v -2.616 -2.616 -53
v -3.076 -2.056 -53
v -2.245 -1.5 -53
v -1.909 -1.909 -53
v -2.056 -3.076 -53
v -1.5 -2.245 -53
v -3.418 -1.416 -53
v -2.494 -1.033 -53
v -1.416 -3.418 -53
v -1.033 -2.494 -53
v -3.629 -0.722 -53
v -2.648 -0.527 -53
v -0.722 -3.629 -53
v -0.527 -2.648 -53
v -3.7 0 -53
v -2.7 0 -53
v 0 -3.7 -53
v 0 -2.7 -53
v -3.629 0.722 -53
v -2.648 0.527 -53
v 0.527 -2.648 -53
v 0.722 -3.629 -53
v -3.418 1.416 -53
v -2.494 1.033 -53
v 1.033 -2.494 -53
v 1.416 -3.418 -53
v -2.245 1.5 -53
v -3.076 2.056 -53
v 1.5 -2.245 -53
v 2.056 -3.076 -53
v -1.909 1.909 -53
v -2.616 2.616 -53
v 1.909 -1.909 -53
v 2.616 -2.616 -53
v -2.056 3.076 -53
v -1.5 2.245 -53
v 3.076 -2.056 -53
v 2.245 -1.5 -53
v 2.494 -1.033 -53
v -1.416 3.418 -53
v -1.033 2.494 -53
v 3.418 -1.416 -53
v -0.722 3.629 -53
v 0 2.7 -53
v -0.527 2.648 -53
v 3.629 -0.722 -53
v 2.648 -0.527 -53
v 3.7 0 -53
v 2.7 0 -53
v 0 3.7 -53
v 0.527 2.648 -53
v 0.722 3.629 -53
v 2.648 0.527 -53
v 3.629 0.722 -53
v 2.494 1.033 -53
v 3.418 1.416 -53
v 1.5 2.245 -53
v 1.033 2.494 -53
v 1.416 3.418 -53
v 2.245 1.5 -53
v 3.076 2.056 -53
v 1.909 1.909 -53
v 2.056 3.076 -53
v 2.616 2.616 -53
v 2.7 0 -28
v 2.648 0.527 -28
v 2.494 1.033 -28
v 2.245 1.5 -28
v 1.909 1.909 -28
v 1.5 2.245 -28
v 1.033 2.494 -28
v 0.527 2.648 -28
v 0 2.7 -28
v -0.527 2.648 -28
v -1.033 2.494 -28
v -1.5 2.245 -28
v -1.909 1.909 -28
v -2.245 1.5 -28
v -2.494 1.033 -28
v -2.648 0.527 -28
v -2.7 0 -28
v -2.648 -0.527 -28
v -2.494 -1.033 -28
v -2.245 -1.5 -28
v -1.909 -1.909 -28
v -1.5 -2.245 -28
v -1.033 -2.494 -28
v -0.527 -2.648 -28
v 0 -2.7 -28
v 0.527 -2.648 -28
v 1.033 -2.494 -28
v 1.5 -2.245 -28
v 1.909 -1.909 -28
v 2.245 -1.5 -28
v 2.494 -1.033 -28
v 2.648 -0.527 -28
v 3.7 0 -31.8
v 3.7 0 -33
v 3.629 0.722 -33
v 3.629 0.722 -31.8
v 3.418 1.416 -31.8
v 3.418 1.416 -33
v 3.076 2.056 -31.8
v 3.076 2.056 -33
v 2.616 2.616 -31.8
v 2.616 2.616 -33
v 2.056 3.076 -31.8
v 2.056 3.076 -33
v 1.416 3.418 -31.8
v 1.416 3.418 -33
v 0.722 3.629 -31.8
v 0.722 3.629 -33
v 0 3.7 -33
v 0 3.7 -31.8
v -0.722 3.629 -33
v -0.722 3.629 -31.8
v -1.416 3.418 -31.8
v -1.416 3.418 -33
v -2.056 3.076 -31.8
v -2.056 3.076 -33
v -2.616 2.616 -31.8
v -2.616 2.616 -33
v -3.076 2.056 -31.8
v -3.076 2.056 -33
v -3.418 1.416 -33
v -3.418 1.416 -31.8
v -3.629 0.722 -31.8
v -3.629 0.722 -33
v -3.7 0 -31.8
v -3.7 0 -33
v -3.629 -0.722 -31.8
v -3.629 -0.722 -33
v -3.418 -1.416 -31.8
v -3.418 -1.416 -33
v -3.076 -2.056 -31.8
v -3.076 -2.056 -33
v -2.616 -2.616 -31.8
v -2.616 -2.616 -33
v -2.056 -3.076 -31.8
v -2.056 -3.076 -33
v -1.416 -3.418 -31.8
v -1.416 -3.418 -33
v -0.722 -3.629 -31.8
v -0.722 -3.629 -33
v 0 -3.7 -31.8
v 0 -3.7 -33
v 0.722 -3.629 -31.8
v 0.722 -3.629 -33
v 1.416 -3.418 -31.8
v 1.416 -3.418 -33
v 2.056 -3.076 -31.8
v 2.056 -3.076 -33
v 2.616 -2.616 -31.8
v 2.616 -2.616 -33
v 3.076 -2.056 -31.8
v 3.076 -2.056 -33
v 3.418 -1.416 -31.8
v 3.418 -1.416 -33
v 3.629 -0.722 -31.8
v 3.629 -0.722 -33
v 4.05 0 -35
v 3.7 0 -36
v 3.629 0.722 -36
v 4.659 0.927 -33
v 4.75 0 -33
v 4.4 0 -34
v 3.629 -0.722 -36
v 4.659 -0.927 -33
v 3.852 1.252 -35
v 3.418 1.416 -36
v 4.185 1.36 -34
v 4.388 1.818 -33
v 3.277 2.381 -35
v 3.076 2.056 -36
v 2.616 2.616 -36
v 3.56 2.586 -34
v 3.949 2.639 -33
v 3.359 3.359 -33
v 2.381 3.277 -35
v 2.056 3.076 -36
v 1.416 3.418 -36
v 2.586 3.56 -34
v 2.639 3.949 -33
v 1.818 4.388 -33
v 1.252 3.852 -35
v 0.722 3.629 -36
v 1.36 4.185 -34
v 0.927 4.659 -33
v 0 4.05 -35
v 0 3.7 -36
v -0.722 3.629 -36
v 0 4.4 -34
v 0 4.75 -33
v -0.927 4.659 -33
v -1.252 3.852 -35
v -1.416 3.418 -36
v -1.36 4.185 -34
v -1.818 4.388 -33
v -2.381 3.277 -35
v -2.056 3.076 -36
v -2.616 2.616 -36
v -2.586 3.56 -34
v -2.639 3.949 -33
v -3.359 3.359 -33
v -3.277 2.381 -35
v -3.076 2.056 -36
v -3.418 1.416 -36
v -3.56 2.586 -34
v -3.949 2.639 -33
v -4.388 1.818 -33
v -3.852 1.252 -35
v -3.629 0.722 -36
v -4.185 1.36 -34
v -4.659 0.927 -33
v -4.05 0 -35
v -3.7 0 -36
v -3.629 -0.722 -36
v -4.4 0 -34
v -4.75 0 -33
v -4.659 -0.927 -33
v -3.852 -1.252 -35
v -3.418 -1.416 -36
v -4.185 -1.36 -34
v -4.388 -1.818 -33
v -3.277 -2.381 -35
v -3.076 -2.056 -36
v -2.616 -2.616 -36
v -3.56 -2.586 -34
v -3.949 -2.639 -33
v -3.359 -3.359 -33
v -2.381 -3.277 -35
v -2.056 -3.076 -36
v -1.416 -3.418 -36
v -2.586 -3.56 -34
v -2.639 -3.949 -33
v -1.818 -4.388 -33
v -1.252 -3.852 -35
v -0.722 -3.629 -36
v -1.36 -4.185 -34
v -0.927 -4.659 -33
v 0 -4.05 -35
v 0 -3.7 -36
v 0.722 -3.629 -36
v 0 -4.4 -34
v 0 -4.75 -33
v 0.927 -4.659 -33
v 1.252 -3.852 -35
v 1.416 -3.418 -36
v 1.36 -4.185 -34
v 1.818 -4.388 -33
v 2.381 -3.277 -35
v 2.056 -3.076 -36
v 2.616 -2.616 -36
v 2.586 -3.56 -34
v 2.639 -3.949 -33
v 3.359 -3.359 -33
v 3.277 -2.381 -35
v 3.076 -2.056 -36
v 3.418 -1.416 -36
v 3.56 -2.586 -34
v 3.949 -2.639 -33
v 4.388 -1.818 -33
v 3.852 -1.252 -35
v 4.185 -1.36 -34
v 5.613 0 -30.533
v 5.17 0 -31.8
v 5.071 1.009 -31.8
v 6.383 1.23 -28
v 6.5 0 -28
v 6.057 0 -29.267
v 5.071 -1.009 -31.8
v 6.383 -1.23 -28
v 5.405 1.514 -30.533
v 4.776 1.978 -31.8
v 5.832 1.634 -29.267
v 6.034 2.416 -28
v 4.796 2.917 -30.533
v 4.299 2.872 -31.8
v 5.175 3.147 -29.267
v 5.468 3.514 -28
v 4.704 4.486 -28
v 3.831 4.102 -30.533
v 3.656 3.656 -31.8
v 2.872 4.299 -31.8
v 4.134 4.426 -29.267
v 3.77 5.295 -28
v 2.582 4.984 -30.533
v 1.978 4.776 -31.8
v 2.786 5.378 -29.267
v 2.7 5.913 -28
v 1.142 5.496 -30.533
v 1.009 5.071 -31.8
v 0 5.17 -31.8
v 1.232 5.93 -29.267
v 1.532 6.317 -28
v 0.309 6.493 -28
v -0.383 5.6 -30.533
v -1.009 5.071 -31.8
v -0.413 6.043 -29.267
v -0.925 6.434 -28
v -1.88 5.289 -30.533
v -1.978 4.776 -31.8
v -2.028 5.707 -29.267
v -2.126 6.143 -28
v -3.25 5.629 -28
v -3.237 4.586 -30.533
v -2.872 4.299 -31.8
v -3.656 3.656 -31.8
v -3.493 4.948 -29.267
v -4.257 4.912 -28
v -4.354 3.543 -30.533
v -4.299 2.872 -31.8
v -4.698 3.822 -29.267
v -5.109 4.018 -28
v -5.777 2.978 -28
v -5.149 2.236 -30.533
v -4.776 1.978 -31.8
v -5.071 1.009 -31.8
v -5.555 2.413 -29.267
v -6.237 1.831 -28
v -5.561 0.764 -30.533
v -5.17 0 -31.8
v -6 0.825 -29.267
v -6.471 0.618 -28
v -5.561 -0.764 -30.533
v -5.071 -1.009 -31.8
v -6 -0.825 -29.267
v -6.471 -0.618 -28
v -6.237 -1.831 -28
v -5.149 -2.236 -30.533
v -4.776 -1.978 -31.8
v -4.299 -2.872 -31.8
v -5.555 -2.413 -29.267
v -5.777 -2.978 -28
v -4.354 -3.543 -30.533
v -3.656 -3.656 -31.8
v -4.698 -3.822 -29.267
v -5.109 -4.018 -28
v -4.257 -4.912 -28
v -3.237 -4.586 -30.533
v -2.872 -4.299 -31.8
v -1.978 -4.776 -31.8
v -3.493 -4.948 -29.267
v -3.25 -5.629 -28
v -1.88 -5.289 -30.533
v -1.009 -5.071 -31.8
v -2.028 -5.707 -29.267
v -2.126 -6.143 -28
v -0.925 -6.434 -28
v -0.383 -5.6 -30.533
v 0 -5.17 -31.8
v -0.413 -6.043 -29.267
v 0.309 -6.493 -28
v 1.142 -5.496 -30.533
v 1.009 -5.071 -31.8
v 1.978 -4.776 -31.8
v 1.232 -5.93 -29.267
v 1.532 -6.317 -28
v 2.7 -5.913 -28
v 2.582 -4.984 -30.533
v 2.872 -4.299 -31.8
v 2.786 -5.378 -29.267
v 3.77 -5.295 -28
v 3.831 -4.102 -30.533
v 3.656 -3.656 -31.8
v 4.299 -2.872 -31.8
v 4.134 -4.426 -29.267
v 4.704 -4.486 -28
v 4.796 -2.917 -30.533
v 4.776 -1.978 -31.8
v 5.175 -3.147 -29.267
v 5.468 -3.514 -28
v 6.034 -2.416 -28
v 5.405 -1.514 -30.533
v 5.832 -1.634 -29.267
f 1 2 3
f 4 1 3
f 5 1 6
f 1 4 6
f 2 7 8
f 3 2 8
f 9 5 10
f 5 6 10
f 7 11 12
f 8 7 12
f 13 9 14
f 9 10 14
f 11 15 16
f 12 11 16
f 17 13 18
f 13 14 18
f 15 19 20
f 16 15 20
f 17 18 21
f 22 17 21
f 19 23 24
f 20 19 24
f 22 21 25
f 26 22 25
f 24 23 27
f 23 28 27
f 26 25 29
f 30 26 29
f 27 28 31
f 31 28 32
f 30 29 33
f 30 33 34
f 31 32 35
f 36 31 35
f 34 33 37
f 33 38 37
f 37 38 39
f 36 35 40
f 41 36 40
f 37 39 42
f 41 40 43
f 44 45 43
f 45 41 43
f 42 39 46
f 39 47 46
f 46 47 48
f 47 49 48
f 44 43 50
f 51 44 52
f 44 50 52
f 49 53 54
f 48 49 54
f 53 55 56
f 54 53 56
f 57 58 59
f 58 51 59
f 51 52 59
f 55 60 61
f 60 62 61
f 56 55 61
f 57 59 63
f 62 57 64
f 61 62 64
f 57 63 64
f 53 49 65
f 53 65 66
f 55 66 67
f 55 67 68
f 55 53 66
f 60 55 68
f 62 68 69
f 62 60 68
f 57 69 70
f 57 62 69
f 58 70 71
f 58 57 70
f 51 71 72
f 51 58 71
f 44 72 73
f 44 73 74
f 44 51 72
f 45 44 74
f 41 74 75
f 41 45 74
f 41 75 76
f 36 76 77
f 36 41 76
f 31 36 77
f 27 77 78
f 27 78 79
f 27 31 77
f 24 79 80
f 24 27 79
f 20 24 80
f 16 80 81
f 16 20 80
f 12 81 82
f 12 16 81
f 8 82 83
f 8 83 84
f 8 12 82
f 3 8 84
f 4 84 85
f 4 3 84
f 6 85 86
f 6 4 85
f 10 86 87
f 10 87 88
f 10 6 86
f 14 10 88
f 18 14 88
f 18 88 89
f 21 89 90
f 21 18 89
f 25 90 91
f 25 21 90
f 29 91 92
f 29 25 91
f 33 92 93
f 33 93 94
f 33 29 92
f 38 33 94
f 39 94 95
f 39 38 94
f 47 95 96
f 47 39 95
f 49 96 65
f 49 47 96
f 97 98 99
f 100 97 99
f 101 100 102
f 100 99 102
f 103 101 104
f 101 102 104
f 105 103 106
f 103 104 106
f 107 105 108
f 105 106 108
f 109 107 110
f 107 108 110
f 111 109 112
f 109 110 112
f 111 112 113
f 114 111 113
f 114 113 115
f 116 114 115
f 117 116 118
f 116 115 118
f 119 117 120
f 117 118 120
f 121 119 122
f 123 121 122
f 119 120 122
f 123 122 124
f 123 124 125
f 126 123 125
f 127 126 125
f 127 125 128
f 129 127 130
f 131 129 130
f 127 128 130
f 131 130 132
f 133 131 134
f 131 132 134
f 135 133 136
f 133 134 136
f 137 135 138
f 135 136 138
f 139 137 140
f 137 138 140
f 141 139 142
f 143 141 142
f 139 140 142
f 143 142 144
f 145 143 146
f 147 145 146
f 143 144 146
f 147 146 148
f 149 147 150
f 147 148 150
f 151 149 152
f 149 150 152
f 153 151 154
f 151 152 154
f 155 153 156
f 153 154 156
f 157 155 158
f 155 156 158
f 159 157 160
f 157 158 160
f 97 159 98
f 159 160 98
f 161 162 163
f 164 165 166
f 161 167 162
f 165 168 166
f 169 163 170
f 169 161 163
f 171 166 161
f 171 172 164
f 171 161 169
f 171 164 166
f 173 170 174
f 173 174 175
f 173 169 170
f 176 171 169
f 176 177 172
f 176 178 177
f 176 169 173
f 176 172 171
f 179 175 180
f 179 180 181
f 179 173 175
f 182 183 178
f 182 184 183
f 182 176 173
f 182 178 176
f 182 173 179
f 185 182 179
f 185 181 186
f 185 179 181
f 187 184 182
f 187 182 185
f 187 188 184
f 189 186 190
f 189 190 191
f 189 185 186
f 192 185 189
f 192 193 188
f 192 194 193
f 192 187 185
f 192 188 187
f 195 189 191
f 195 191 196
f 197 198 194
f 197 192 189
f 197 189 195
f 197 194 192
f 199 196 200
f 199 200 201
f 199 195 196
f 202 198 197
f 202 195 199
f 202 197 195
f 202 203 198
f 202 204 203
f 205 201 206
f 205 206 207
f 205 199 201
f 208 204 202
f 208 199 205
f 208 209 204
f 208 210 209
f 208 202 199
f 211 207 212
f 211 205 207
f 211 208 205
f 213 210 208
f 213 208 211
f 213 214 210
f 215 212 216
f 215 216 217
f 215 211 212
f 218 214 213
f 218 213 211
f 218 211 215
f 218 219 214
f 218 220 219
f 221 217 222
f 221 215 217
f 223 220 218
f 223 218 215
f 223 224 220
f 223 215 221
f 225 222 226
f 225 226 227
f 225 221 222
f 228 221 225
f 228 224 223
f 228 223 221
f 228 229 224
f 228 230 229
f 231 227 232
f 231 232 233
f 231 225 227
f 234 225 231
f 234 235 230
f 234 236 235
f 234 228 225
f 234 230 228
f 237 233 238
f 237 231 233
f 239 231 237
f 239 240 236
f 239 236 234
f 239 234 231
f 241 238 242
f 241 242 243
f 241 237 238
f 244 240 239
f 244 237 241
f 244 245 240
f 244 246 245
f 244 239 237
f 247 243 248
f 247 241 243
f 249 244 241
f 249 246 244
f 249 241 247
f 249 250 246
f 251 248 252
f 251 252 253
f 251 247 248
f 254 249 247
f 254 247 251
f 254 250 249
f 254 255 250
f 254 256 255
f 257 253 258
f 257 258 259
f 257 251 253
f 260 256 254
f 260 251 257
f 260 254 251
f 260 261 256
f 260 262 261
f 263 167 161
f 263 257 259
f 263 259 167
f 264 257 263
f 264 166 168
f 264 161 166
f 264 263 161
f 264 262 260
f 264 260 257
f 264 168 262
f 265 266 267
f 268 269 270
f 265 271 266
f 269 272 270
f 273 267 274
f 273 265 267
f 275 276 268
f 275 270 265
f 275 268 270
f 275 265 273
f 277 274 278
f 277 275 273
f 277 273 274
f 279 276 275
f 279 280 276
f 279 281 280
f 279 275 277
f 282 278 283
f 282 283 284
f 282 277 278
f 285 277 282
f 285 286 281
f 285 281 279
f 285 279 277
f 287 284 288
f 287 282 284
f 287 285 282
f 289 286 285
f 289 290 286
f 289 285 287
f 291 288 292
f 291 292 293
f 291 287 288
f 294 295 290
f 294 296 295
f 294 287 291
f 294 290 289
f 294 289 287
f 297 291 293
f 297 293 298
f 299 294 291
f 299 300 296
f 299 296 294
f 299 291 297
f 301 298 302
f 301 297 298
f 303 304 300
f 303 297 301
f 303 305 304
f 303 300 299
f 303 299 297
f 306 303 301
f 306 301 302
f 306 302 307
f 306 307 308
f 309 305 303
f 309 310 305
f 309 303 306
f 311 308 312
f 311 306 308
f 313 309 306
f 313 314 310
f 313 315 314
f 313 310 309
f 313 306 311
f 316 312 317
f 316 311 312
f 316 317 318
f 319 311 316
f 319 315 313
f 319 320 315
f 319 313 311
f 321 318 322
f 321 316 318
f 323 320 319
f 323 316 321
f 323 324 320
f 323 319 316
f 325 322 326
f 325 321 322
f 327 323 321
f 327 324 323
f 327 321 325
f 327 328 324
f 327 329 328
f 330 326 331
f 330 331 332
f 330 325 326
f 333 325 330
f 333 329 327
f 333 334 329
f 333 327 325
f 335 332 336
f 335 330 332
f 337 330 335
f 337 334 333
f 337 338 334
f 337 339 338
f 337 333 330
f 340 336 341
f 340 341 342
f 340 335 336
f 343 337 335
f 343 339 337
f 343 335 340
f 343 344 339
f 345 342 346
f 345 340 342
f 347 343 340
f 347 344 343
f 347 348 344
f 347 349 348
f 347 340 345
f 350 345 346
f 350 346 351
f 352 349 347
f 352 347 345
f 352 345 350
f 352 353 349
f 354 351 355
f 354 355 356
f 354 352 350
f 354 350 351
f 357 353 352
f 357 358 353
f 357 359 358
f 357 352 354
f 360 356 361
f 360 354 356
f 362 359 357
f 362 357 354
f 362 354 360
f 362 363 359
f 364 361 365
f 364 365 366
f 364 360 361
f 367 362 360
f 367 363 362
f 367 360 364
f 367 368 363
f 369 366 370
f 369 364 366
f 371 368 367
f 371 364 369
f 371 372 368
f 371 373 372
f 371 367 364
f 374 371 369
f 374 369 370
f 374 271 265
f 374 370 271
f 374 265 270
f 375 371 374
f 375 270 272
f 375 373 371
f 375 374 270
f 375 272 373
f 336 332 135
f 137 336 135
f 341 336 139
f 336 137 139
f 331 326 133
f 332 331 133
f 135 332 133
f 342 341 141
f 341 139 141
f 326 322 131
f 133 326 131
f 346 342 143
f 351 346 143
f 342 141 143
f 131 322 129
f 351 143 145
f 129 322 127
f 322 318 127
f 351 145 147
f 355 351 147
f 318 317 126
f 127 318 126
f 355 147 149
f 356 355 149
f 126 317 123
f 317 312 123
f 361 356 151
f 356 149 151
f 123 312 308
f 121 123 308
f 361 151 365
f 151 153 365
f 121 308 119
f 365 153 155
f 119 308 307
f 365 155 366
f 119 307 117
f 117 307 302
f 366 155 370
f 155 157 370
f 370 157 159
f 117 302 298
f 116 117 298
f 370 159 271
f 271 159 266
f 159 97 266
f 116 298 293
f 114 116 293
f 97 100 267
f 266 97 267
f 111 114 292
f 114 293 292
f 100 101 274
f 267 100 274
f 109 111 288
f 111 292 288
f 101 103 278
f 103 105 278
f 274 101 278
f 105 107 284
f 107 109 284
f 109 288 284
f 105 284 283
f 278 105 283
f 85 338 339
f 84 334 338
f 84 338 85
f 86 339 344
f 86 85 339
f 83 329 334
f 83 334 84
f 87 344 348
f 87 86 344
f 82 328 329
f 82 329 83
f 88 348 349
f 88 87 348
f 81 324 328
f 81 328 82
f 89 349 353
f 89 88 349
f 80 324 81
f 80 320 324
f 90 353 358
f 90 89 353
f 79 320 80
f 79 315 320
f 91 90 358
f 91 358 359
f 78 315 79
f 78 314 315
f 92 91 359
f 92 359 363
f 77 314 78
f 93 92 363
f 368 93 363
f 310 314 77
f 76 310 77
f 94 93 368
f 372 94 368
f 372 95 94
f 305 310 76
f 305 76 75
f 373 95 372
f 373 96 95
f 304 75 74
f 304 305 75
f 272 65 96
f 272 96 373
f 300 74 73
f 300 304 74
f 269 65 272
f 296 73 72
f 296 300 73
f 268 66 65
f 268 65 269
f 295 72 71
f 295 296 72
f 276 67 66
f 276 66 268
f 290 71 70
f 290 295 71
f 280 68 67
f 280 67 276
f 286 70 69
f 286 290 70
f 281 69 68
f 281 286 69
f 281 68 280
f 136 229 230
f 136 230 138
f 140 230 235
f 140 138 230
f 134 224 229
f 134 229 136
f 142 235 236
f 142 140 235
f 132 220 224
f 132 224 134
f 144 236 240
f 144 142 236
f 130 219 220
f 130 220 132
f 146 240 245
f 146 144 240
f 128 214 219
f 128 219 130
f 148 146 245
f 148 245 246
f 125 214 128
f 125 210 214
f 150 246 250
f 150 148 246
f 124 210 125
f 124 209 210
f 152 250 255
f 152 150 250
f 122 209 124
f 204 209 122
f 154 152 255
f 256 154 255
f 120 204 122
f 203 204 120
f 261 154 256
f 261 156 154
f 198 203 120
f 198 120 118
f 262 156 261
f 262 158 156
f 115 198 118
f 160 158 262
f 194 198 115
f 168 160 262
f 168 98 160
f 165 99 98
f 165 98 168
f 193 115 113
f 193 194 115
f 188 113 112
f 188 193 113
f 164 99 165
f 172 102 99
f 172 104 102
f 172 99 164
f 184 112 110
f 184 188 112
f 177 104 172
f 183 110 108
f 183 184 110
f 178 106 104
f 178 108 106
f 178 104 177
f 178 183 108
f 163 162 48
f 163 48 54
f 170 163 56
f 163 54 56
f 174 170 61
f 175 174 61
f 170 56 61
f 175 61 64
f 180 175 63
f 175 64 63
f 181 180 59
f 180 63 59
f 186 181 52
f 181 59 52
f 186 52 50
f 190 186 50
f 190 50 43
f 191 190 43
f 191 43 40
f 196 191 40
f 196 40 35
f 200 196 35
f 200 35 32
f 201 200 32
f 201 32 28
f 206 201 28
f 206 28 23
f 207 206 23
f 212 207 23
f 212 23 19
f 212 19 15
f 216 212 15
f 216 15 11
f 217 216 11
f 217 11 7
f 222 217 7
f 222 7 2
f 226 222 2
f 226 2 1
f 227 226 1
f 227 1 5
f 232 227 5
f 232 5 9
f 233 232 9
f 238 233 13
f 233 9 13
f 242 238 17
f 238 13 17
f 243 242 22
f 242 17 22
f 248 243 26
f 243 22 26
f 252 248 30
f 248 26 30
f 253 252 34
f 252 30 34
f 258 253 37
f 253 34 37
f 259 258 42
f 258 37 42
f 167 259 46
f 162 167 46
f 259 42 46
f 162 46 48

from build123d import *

# Parameters (mm, degrees)
CYLINDER043_R     = 2.7
CYLINDER043_DEPTH = 25
CYLINDER042_R     = 3.7
CYLINDER042_DEPTH = 25
CYLINDER040_R     = 3.7
CYLINDER040_DEPTH = 1.2
CYLINDER041_R     = 6
CYLINDER041_DEPTH = 1.2


with BuildPart() as cylinder041:
    # Cylinder043 → Cylinder043 (new body)
    with BuildSketch(Plane.XY.offset(-38)):
        Circle(CYLINDER043_R)
    extrude(amount=CYLINDER043_DEPTH)


with BuildPart() as cylinder040:
    # Cylinder042 → Cylinder042 (new body)
    with BuildSketch(Plane.XY.offset(-38)):
        Circle(CYLINDER042_R)
    extrude(amount=CYLINDER042_DEPTH)


with BuildPart() as cylinder038:
    # Cylinder040 → Cylinder040 (new body)
    with BuildSketch(Plane.XY.offset(-18)):
        Circle(CYLINDER040_R)
    extrude(amount=CYLINDER040_DEPTH)


with BuildPart() as cut013005:
    # Cylinder041 → Cylinder041 (new body)
    with BuildSketch(Plane.XY.offset(-18)):
        Circle(CYLINDER041_R)
    extrude(amount=CYLINDER041_DEPTH)

    # Cut013005: cut Cylinder038
    add(cylinder038.part, mode=Mode.SUBTRACT)


with BuildPart() as connector_boot:
    # Cone004 → Cone004 (revolve)
    with BuildSketch(Plane(origin=(0, 0, -21), x_dir=(1, 0, 0), z_dir=(0, -1, 0))):
        Polygon((0, 0), (3.7, 0), (6.5, 8), (0, 8), align=None)
    revolve(axis=Axis((0, 0, -21), (0, 0, 1)))

    # Cut013006: cut Cut013005
    add(cut013005.part, mode=Mode.SUBTRACT)

    # Fusion017: union Cylinder040
    add(cylinder040.part)

    # Cut013007: cut Cylinder041
    add(cylinder041.part, mode=Mode.SUBTRACT)


with BuildPart() as connector_boot_1:
    # Cut013007 placement: moved
    add(connector_boot.part.moved(Location((0, 0, -15))))


solid = connector_boot_1.part
